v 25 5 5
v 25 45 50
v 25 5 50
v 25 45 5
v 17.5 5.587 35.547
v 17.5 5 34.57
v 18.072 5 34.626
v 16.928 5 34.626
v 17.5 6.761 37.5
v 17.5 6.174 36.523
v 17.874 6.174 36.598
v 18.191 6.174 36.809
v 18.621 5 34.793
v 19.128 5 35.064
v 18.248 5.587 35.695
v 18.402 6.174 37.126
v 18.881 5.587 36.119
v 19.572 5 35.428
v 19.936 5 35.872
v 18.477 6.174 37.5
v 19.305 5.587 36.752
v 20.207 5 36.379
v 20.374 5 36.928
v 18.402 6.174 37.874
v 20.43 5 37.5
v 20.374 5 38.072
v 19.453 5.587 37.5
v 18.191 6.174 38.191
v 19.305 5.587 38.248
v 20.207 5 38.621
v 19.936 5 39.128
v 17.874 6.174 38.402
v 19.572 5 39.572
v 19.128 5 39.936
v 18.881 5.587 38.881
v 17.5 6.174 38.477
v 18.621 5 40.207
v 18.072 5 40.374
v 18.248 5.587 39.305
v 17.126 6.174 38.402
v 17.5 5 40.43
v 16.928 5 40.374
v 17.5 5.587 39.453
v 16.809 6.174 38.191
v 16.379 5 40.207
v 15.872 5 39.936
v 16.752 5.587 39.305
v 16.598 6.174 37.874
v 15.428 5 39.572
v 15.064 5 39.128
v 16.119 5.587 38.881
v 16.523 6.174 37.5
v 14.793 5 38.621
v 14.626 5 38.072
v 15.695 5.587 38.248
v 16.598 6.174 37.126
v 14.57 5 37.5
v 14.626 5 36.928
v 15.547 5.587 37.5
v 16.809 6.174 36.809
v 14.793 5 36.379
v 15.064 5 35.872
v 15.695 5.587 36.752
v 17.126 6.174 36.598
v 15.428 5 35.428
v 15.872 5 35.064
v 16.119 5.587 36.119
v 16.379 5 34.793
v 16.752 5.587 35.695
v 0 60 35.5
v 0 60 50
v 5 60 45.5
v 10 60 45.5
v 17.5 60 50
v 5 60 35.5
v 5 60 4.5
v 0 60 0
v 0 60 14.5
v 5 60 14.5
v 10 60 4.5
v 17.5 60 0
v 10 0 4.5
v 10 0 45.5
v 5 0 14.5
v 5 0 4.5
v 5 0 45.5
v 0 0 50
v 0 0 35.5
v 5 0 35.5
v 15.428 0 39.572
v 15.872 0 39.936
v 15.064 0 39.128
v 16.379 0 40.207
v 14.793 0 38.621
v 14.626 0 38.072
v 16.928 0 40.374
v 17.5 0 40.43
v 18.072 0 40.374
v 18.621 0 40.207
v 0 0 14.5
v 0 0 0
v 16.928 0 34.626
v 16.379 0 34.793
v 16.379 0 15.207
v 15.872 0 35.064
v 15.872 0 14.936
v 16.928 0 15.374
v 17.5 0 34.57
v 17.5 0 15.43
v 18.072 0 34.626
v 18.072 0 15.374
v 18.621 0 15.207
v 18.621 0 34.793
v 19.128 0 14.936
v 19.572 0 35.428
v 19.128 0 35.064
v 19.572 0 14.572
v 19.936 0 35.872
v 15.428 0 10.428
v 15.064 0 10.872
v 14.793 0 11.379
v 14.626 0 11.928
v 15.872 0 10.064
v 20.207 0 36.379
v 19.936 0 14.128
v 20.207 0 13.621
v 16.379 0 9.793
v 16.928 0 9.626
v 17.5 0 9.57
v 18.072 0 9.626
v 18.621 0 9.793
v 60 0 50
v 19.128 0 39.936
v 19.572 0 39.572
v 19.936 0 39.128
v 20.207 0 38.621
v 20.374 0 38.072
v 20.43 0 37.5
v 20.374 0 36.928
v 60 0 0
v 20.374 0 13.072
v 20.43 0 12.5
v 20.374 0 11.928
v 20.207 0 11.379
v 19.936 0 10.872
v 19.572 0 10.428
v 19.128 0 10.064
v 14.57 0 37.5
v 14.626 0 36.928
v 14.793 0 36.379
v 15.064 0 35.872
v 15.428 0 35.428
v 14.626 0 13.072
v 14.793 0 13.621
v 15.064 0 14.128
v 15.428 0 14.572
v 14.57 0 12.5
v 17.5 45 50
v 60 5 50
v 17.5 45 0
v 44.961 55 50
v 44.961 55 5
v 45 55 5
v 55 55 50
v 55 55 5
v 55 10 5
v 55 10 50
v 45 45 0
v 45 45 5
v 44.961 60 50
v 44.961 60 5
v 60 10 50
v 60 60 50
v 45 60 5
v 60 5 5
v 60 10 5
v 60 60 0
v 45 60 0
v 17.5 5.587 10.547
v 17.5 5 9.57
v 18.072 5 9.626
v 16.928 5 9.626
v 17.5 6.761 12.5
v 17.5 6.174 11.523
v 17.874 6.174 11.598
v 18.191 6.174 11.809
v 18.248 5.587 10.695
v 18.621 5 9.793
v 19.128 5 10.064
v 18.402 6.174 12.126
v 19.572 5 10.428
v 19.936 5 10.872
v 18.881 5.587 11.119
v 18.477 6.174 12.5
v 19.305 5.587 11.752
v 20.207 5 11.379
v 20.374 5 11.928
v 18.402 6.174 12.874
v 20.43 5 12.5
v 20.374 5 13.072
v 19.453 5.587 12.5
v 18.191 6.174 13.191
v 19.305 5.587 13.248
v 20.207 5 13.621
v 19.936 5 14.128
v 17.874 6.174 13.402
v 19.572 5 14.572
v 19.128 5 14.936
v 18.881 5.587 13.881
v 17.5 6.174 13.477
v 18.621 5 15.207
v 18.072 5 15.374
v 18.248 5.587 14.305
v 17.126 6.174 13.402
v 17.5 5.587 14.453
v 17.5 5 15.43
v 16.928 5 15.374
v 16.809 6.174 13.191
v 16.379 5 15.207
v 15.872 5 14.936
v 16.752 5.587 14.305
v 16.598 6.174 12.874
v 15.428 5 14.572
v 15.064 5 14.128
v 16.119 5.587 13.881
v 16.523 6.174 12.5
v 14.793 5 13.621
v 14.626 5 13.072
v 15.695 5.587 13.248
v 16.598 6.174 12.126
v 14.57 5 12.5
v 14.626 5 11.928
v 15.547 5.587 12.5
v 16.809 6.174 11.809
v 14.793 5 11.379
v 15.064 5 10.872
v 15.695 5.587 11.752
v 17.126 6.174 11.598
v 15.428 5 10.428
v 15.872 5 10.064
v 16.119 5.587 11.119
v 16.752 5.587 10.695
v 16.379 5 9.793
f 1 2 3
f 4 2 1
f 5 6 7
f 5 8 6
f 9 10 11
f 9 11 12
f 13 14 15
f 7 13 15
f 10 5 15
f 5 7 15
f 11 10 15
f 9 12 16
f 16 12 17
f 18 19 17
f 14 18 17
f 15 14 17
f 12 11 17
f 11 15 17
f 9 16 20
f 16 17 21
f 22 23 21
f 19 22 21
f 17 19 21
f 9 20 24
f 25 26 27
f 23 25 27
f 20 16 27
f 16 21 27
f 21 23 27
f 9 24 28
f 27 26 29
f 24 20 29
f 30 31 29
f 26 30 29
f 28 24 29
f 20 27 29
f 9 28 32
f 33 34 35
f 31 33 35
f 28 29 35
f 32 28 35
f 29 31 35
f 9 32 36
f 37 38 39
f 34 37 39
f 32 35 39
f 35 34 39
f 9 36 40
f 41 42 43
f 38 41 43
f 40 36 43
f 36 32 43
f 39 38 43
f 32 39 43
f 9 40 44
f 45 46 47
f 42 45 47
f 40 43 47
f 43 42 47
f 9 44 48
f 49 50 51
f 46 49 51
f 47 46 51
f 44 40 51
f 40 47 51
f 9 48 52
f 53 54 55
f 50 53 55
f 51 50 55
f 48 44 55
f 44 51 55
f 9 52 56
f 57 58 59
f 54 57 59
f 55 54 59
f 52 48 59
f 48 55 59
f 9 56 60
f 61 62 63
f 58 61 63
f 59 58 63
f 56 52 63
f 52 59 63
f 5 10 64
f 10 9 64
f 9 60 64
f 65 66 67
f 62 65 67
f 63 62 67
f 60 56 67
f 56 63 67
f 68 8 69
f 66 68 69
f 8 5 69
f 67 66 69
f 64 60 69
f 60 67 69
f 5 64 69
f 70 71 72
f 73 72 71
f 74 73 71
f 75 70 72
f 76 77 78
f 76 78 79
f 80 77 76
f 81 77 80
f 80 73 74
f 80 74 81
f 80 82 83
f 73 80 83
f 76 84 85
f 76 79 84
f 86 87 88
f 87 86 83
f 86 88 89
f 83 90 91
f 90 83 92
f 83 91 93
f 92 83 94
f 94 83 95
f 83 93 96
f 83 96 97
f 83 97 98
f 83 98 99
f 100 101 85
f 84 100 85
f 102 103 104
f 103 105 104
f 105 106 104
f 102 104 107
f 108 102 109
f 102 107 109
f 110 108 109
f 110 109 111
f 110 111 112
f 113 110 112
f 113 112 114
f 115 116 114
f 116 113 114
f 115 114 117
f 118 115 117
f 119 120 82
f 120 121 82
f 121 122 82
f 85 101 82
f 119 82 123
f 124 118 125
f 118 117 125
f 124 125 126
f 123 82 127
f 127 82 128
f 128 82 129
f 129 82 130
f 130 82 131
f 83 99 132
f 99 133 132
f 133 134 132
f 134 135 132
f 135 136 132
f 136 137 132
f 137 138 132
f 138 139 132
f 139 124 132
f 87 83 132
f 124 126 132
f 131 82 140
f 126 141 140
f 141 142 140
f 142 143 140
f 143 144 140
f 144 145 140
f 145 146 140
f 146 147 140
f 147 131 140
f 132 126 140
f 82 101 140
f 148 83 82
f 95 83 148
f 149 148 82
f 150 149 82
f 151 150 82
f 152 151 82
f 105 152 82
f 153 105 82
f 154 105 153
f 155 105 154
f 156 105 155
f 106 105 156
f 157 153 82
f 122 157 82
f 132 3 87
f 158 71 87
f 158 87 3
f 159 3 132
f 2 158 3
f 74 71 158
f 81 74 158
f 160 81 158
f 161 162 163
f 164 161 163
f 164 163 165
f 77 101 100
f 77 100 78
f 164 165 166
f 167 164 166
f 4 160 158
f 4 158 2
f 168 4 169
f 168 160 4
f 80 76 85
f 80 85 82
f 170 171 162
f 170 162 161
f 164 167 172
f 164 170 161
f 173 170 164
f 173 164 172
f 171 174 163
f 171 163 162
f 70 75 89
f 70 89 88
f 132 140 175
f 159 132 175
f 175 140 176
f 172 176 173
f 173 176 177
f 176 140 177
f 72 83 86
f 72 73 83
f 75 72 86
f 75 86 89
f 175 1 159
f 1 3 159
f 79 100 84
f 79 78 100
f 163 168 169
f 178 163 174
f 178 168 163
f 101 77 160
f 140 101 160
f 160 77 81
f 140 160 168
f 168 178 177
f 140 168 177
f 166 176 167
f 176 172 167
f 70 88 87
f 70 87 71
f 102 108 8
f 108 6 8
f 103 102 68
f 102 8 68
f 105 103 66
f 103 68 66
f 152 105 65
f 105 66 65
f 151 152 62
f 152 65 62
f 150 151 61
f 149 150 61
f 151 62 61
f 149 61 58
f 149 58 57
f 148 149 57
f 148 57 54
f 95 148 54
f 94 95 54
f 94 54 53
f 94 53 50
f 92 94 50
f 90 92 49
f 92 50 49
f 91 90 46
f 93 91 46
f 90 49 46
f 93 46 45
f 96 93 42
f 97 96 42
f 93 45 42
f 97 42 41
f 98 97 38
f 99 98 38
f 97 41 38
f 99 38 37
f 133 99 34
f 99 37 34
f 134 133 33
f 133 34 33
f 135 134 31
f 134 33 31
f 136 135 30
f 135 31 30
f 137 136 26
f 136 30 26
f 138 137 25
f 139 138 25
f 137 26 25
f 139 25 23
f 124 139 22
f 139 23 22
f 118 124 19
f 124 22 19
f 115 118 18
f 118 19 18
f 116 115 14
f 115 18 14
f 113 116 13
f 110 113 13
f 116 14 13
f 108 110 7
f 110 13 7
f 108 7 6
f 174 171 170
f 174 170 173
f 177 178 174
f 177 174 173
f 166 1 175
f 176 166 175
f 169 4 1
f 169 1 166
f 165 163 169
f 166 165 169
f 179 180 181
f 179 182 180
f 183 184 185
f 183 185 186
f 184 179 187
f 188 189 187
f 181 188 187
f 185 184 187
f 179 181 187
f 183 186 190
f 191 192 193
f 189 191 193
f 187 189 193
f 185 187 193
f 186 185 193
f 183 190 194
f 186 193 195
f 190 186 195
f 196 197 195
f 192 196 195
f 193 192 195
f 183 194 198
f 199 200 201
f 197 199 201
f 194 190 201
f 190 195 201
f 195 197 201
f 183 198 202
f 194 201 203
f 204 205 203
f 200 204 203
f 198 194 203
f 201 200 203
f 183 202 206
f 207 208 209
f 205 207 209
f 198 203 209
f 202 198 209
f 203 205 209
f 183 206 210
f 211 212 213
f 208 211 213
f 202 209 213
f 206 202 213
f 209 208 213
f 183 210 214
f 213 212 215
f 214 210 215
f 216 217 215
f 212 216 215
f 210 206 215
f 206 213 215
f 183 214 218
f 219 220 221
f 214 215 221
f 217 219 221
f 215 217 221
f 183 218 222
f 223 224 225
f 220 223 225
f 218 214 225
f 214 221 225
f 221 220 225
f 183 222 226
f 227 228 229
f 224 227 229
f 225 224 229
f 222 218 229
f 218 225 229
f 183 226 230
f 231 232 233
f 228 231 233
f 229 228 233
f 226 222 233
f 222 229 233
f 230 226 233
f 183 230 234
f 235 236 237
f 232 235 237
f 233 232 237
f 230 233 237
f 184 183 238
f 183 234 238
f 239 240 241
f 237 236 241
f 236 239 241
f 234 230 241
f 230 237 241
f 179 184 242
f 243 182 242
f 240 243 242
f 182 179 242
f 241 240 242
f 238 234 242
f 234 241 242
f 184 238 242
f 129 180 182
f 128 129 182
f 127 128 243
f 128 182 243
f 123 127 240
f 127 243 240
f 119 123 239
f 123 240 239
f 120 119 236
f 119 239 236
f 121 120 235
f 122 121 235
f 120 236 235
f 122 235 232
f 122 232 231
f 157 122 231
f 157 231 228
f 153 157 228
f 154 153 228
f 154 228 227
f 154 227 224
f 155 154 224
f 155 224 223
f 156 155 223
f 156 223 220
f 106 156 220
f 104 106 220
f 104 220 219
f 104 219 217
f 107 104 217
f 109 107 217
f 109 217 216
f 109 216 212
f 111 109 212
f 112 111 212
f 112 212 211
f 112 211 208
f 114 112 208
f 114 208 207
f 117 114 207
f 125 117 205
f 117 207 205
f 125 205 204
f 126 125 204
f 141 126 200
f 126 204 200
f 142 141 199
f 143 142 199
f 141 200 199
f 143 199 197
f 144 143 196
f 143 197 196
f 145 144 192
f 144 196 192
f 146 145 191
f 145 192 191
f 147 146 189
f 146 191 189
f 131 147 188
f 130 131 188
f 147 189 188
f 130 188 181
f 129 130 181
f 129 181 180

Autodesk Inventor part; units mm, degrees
ref_plane "YZ Plane" through (0, 0, 0) normal (1, 0, 0) x (0, 1, 0)
ref_plane "XZ Plane" through (0, 0, 0) normal (0, 1, 0) x (-1, 0, 0)
ref_plane "XY Plane" through (0, 0, 0) normal (0, 0, 1) x (1, 0, 0)
sketch "Sketch3" plane through (0, 0, 0) normal (0, 0, 1) x (1, 0, 0)
  line L0 (0, 0) -> (0, 60)
  line L1 (0, 60) -> (17.5, 60)
  line L2 (17.5, 60) -> (17.5, 45)
  line L3 (17.5, 45) -> (45, 45)
  line L4 (45, 45) -> (45, 60)
  line L5 (10.4377, 0) -> (0, 0)
  line L6 (45, 60) -> (60, 60)
  line L7 (60, 60) -> (60, 0)
  line L8 (60, 0) -> (0, 0)
  dimension "d7" = 60
  dimension "d8" = 17.5
  dimension "d12" = 15
  dimension "d13" = 27.5
  dimension "d14" = 15
  dimension "d15" = 60
  dimension "d16" = 60
extrude "Extrusion2" add sketch "Sketch3" along normal blind 5
sketch "Sketch4" plane through (0, 60, 0) normal (0, 1, 0) x (1, 0, 0)
  line L0 (17.5, -5) -> (0, -5) projected
  line L1 (0, -50) -> (17.5, -50)
  line L2 (17.5, -50) -> (17.5, -5)
  line L3 (17.5, -5) -> (0, -5)
  line L4 (0, -5) -> (0, -50)
  point P0 (0, 0)
  dimension "d20" = 45
  dimension "d21" = 17.5
extrude "Extrusion3" add sketch "Sketch4" against normal blind 60
sketch "Sketch5" plane through (45, 60, 0) normal (0, 1, 0) x (1, 0, 0)
  line L0 (15, 0) -> (15, -5) projected
  line L1 (-0.039, -50) -> (15, -50)
  line L2 (15, -50) -> (15, -5)
  line L3 (15, -5) -> (-0.039, -5)
  line L4 (-0.039, -5) -> (-0.039, -50)
  point P0 (-45, 0)
  dimension "d24" = 45
extrude "Extrusion4" add sketch "Sketch5" against normal blind 5
sketch "Sketch7" plane through (17.5, 45, 0) normal (0, 1, 0) x (1, 0, 0)
  line L0 (0, -5) -> (0, -50) projected
  line L1 (27.5, -5) -> (0, -5) projected
  line L2 (0, -50) -> (7.5, -50)
  line L3 (7.5, -50) -> (7.5, -5)
  line L4 (7.5, -5) -> (0, -5)
  line L5 (0, -5) -> (0, -50)
  point P0 (-17.5, 0)
  dimension "d27" = 7.5
extrude "Extrusion5" add sketch "Sketch7" against normal blind 45
sketch "Sketch8" plane through (0, 0, 5) normal (0, 0, 1) x (1, 0, 0)
  line L0 (25, 0) -> (60, 0) projected
  line L1 (60, 0) -> (60, 55) projected
  line L2 (25, 0) -> (60, 0)
  line L3 (60, 0) -> (60, 5)
  line L4 (60, 5) -> (25, 5)
  line L5 (25, 5) -> (25, 0)
  point P0 (0, 0)
  dimension "d30" = 5
extrude "Extrusion6" add sketch "Sketch8" along normal blind 45
sketch "Sketch9" plane through (0, 0, 5) normal (0, 0, 1) x (1, 0, 0)
  line L0 (60, 55) -> (45, 55) projected
  line L1 (60, 55) -> (55, 55)
  line L2 (55, 55) -> (55, 5)
  line L3 (55, 5) -> (60, 5)
  line L4 (60, 5) -> (60, 55)
  point P0 (0, 0)
  dimension "d33" = 50
  dimension "d34" = 5
extrude "Extrusion7" add sketch "Sketch9" along normal blind 45
sketch "Sketch10" plane through (0, 60, 0) normal (0, 1, 0) x (1, 0, 0)
  line L0 (10, -45.5) -> (5, -45.5)
  line L1 (5, -45.5) -> (5, -4.5)
  line L2 (5, -4.5) -> (10, -4.5)
  line L3 (10, -4.5) -> (10, -45.5)
  line L4 (17.5, 0) -> (17.5, -50) projected
  line L5 (0, 0) -> (17.5, 0) projected
  line L6 (0, 0) -> (0, -50) projected
  dimension "d45" = 5
  dimension "d46" = 41
  dimension "d47" = 7.5
  dimension "d48" = 4.5
  dimension "d49" = 5
extrude "Extrusion8" cut sketch "Sketch10" against normal blind 60
sketch "Sketch11" plane through (0, 60, 0) normal (0, 1, 0) x (1, 0, 0)
  line L0 (5, -4.5) -> (5, -45.5) projected
  line L1 (0, 0) -> (0, -50) projected
  line L2 (5, -35.5) -> (0, -35.5)
  line L3 (0, -35.5) -> (0, -14.5)
  line L4 (0, -14.5) -> (5, -14.5)
  line L5 (5, -14.5) -> (5, -35.5)
  line L6 (0, -50) -> (17.5, -50) projected
  dimension "d52" = 21
  dimension "d53" = 14.5
extrude "Extrusion9" cut sketch "Sketch11" against normal blind 60
sketch "Sketch12" plane through (0, 0, 0) normal (0, -1, 0) x (1, 0, 0)
  circle A0 centre (17.5, 12.5) radius 2.5
  circle A1 centre (17.5, 37.5) radius 2.5
  line L0 (10, 45.5) -> (10, 4.5) projected
  line L1 (0, 50) -> (60, 50) projected
  line L2 (60, 0) -> (0, 0) projected
  dimension "d56" = 5
  dimension "d57" = 5
  dimension "d58" = 7.5
  dimension "d59" = 7.5
  dimension "d60" = 12.5
  dimension "d61" = 12.5
hole "Hole1" at (17.5, 0, 12.5) at (17.5, 0, 37.5) direction (0, 1, 0) diameter 5.86 depth 5 tip angle 118
sketch "Sketch13" plane through (0, 60, 0) normal (0, 1, 0) x (1, 0, 0)
  point P0 (0, 0)
sketch "Sketch14" plane through (0, 60, 50) normal (0, 0, 1) x (1, 0, 0)
  line L0 (55, -5) -> (55, -55) projected
  line L1 (60, 0) -> (60, -60) projected
  line L2 (55, -55) -> (60, -55)
  line L3 (60, -55) -> (60, -50)
  line L4 (60, -50) -> (55, -50)
  line L5 (55, -50) -> (55, -55)
  point P0 (0, -60)
  dimension "d69" = 5
extrude "Extrusion10" cut sketch "Sketch14" against normal blind 45
sketch "Sketch15" plane through (5, 60, 35.5) normal (0, 0, -1) x (-1, 0, 0)
  point P0 (5, -60)
sketch "Sketch16" plane through (0, 60, 0) normal (0, 1, 0) x (1, 0, 0)
  point P0 (0, 0)
properties part number "Holder" material "Iron, Cast"
